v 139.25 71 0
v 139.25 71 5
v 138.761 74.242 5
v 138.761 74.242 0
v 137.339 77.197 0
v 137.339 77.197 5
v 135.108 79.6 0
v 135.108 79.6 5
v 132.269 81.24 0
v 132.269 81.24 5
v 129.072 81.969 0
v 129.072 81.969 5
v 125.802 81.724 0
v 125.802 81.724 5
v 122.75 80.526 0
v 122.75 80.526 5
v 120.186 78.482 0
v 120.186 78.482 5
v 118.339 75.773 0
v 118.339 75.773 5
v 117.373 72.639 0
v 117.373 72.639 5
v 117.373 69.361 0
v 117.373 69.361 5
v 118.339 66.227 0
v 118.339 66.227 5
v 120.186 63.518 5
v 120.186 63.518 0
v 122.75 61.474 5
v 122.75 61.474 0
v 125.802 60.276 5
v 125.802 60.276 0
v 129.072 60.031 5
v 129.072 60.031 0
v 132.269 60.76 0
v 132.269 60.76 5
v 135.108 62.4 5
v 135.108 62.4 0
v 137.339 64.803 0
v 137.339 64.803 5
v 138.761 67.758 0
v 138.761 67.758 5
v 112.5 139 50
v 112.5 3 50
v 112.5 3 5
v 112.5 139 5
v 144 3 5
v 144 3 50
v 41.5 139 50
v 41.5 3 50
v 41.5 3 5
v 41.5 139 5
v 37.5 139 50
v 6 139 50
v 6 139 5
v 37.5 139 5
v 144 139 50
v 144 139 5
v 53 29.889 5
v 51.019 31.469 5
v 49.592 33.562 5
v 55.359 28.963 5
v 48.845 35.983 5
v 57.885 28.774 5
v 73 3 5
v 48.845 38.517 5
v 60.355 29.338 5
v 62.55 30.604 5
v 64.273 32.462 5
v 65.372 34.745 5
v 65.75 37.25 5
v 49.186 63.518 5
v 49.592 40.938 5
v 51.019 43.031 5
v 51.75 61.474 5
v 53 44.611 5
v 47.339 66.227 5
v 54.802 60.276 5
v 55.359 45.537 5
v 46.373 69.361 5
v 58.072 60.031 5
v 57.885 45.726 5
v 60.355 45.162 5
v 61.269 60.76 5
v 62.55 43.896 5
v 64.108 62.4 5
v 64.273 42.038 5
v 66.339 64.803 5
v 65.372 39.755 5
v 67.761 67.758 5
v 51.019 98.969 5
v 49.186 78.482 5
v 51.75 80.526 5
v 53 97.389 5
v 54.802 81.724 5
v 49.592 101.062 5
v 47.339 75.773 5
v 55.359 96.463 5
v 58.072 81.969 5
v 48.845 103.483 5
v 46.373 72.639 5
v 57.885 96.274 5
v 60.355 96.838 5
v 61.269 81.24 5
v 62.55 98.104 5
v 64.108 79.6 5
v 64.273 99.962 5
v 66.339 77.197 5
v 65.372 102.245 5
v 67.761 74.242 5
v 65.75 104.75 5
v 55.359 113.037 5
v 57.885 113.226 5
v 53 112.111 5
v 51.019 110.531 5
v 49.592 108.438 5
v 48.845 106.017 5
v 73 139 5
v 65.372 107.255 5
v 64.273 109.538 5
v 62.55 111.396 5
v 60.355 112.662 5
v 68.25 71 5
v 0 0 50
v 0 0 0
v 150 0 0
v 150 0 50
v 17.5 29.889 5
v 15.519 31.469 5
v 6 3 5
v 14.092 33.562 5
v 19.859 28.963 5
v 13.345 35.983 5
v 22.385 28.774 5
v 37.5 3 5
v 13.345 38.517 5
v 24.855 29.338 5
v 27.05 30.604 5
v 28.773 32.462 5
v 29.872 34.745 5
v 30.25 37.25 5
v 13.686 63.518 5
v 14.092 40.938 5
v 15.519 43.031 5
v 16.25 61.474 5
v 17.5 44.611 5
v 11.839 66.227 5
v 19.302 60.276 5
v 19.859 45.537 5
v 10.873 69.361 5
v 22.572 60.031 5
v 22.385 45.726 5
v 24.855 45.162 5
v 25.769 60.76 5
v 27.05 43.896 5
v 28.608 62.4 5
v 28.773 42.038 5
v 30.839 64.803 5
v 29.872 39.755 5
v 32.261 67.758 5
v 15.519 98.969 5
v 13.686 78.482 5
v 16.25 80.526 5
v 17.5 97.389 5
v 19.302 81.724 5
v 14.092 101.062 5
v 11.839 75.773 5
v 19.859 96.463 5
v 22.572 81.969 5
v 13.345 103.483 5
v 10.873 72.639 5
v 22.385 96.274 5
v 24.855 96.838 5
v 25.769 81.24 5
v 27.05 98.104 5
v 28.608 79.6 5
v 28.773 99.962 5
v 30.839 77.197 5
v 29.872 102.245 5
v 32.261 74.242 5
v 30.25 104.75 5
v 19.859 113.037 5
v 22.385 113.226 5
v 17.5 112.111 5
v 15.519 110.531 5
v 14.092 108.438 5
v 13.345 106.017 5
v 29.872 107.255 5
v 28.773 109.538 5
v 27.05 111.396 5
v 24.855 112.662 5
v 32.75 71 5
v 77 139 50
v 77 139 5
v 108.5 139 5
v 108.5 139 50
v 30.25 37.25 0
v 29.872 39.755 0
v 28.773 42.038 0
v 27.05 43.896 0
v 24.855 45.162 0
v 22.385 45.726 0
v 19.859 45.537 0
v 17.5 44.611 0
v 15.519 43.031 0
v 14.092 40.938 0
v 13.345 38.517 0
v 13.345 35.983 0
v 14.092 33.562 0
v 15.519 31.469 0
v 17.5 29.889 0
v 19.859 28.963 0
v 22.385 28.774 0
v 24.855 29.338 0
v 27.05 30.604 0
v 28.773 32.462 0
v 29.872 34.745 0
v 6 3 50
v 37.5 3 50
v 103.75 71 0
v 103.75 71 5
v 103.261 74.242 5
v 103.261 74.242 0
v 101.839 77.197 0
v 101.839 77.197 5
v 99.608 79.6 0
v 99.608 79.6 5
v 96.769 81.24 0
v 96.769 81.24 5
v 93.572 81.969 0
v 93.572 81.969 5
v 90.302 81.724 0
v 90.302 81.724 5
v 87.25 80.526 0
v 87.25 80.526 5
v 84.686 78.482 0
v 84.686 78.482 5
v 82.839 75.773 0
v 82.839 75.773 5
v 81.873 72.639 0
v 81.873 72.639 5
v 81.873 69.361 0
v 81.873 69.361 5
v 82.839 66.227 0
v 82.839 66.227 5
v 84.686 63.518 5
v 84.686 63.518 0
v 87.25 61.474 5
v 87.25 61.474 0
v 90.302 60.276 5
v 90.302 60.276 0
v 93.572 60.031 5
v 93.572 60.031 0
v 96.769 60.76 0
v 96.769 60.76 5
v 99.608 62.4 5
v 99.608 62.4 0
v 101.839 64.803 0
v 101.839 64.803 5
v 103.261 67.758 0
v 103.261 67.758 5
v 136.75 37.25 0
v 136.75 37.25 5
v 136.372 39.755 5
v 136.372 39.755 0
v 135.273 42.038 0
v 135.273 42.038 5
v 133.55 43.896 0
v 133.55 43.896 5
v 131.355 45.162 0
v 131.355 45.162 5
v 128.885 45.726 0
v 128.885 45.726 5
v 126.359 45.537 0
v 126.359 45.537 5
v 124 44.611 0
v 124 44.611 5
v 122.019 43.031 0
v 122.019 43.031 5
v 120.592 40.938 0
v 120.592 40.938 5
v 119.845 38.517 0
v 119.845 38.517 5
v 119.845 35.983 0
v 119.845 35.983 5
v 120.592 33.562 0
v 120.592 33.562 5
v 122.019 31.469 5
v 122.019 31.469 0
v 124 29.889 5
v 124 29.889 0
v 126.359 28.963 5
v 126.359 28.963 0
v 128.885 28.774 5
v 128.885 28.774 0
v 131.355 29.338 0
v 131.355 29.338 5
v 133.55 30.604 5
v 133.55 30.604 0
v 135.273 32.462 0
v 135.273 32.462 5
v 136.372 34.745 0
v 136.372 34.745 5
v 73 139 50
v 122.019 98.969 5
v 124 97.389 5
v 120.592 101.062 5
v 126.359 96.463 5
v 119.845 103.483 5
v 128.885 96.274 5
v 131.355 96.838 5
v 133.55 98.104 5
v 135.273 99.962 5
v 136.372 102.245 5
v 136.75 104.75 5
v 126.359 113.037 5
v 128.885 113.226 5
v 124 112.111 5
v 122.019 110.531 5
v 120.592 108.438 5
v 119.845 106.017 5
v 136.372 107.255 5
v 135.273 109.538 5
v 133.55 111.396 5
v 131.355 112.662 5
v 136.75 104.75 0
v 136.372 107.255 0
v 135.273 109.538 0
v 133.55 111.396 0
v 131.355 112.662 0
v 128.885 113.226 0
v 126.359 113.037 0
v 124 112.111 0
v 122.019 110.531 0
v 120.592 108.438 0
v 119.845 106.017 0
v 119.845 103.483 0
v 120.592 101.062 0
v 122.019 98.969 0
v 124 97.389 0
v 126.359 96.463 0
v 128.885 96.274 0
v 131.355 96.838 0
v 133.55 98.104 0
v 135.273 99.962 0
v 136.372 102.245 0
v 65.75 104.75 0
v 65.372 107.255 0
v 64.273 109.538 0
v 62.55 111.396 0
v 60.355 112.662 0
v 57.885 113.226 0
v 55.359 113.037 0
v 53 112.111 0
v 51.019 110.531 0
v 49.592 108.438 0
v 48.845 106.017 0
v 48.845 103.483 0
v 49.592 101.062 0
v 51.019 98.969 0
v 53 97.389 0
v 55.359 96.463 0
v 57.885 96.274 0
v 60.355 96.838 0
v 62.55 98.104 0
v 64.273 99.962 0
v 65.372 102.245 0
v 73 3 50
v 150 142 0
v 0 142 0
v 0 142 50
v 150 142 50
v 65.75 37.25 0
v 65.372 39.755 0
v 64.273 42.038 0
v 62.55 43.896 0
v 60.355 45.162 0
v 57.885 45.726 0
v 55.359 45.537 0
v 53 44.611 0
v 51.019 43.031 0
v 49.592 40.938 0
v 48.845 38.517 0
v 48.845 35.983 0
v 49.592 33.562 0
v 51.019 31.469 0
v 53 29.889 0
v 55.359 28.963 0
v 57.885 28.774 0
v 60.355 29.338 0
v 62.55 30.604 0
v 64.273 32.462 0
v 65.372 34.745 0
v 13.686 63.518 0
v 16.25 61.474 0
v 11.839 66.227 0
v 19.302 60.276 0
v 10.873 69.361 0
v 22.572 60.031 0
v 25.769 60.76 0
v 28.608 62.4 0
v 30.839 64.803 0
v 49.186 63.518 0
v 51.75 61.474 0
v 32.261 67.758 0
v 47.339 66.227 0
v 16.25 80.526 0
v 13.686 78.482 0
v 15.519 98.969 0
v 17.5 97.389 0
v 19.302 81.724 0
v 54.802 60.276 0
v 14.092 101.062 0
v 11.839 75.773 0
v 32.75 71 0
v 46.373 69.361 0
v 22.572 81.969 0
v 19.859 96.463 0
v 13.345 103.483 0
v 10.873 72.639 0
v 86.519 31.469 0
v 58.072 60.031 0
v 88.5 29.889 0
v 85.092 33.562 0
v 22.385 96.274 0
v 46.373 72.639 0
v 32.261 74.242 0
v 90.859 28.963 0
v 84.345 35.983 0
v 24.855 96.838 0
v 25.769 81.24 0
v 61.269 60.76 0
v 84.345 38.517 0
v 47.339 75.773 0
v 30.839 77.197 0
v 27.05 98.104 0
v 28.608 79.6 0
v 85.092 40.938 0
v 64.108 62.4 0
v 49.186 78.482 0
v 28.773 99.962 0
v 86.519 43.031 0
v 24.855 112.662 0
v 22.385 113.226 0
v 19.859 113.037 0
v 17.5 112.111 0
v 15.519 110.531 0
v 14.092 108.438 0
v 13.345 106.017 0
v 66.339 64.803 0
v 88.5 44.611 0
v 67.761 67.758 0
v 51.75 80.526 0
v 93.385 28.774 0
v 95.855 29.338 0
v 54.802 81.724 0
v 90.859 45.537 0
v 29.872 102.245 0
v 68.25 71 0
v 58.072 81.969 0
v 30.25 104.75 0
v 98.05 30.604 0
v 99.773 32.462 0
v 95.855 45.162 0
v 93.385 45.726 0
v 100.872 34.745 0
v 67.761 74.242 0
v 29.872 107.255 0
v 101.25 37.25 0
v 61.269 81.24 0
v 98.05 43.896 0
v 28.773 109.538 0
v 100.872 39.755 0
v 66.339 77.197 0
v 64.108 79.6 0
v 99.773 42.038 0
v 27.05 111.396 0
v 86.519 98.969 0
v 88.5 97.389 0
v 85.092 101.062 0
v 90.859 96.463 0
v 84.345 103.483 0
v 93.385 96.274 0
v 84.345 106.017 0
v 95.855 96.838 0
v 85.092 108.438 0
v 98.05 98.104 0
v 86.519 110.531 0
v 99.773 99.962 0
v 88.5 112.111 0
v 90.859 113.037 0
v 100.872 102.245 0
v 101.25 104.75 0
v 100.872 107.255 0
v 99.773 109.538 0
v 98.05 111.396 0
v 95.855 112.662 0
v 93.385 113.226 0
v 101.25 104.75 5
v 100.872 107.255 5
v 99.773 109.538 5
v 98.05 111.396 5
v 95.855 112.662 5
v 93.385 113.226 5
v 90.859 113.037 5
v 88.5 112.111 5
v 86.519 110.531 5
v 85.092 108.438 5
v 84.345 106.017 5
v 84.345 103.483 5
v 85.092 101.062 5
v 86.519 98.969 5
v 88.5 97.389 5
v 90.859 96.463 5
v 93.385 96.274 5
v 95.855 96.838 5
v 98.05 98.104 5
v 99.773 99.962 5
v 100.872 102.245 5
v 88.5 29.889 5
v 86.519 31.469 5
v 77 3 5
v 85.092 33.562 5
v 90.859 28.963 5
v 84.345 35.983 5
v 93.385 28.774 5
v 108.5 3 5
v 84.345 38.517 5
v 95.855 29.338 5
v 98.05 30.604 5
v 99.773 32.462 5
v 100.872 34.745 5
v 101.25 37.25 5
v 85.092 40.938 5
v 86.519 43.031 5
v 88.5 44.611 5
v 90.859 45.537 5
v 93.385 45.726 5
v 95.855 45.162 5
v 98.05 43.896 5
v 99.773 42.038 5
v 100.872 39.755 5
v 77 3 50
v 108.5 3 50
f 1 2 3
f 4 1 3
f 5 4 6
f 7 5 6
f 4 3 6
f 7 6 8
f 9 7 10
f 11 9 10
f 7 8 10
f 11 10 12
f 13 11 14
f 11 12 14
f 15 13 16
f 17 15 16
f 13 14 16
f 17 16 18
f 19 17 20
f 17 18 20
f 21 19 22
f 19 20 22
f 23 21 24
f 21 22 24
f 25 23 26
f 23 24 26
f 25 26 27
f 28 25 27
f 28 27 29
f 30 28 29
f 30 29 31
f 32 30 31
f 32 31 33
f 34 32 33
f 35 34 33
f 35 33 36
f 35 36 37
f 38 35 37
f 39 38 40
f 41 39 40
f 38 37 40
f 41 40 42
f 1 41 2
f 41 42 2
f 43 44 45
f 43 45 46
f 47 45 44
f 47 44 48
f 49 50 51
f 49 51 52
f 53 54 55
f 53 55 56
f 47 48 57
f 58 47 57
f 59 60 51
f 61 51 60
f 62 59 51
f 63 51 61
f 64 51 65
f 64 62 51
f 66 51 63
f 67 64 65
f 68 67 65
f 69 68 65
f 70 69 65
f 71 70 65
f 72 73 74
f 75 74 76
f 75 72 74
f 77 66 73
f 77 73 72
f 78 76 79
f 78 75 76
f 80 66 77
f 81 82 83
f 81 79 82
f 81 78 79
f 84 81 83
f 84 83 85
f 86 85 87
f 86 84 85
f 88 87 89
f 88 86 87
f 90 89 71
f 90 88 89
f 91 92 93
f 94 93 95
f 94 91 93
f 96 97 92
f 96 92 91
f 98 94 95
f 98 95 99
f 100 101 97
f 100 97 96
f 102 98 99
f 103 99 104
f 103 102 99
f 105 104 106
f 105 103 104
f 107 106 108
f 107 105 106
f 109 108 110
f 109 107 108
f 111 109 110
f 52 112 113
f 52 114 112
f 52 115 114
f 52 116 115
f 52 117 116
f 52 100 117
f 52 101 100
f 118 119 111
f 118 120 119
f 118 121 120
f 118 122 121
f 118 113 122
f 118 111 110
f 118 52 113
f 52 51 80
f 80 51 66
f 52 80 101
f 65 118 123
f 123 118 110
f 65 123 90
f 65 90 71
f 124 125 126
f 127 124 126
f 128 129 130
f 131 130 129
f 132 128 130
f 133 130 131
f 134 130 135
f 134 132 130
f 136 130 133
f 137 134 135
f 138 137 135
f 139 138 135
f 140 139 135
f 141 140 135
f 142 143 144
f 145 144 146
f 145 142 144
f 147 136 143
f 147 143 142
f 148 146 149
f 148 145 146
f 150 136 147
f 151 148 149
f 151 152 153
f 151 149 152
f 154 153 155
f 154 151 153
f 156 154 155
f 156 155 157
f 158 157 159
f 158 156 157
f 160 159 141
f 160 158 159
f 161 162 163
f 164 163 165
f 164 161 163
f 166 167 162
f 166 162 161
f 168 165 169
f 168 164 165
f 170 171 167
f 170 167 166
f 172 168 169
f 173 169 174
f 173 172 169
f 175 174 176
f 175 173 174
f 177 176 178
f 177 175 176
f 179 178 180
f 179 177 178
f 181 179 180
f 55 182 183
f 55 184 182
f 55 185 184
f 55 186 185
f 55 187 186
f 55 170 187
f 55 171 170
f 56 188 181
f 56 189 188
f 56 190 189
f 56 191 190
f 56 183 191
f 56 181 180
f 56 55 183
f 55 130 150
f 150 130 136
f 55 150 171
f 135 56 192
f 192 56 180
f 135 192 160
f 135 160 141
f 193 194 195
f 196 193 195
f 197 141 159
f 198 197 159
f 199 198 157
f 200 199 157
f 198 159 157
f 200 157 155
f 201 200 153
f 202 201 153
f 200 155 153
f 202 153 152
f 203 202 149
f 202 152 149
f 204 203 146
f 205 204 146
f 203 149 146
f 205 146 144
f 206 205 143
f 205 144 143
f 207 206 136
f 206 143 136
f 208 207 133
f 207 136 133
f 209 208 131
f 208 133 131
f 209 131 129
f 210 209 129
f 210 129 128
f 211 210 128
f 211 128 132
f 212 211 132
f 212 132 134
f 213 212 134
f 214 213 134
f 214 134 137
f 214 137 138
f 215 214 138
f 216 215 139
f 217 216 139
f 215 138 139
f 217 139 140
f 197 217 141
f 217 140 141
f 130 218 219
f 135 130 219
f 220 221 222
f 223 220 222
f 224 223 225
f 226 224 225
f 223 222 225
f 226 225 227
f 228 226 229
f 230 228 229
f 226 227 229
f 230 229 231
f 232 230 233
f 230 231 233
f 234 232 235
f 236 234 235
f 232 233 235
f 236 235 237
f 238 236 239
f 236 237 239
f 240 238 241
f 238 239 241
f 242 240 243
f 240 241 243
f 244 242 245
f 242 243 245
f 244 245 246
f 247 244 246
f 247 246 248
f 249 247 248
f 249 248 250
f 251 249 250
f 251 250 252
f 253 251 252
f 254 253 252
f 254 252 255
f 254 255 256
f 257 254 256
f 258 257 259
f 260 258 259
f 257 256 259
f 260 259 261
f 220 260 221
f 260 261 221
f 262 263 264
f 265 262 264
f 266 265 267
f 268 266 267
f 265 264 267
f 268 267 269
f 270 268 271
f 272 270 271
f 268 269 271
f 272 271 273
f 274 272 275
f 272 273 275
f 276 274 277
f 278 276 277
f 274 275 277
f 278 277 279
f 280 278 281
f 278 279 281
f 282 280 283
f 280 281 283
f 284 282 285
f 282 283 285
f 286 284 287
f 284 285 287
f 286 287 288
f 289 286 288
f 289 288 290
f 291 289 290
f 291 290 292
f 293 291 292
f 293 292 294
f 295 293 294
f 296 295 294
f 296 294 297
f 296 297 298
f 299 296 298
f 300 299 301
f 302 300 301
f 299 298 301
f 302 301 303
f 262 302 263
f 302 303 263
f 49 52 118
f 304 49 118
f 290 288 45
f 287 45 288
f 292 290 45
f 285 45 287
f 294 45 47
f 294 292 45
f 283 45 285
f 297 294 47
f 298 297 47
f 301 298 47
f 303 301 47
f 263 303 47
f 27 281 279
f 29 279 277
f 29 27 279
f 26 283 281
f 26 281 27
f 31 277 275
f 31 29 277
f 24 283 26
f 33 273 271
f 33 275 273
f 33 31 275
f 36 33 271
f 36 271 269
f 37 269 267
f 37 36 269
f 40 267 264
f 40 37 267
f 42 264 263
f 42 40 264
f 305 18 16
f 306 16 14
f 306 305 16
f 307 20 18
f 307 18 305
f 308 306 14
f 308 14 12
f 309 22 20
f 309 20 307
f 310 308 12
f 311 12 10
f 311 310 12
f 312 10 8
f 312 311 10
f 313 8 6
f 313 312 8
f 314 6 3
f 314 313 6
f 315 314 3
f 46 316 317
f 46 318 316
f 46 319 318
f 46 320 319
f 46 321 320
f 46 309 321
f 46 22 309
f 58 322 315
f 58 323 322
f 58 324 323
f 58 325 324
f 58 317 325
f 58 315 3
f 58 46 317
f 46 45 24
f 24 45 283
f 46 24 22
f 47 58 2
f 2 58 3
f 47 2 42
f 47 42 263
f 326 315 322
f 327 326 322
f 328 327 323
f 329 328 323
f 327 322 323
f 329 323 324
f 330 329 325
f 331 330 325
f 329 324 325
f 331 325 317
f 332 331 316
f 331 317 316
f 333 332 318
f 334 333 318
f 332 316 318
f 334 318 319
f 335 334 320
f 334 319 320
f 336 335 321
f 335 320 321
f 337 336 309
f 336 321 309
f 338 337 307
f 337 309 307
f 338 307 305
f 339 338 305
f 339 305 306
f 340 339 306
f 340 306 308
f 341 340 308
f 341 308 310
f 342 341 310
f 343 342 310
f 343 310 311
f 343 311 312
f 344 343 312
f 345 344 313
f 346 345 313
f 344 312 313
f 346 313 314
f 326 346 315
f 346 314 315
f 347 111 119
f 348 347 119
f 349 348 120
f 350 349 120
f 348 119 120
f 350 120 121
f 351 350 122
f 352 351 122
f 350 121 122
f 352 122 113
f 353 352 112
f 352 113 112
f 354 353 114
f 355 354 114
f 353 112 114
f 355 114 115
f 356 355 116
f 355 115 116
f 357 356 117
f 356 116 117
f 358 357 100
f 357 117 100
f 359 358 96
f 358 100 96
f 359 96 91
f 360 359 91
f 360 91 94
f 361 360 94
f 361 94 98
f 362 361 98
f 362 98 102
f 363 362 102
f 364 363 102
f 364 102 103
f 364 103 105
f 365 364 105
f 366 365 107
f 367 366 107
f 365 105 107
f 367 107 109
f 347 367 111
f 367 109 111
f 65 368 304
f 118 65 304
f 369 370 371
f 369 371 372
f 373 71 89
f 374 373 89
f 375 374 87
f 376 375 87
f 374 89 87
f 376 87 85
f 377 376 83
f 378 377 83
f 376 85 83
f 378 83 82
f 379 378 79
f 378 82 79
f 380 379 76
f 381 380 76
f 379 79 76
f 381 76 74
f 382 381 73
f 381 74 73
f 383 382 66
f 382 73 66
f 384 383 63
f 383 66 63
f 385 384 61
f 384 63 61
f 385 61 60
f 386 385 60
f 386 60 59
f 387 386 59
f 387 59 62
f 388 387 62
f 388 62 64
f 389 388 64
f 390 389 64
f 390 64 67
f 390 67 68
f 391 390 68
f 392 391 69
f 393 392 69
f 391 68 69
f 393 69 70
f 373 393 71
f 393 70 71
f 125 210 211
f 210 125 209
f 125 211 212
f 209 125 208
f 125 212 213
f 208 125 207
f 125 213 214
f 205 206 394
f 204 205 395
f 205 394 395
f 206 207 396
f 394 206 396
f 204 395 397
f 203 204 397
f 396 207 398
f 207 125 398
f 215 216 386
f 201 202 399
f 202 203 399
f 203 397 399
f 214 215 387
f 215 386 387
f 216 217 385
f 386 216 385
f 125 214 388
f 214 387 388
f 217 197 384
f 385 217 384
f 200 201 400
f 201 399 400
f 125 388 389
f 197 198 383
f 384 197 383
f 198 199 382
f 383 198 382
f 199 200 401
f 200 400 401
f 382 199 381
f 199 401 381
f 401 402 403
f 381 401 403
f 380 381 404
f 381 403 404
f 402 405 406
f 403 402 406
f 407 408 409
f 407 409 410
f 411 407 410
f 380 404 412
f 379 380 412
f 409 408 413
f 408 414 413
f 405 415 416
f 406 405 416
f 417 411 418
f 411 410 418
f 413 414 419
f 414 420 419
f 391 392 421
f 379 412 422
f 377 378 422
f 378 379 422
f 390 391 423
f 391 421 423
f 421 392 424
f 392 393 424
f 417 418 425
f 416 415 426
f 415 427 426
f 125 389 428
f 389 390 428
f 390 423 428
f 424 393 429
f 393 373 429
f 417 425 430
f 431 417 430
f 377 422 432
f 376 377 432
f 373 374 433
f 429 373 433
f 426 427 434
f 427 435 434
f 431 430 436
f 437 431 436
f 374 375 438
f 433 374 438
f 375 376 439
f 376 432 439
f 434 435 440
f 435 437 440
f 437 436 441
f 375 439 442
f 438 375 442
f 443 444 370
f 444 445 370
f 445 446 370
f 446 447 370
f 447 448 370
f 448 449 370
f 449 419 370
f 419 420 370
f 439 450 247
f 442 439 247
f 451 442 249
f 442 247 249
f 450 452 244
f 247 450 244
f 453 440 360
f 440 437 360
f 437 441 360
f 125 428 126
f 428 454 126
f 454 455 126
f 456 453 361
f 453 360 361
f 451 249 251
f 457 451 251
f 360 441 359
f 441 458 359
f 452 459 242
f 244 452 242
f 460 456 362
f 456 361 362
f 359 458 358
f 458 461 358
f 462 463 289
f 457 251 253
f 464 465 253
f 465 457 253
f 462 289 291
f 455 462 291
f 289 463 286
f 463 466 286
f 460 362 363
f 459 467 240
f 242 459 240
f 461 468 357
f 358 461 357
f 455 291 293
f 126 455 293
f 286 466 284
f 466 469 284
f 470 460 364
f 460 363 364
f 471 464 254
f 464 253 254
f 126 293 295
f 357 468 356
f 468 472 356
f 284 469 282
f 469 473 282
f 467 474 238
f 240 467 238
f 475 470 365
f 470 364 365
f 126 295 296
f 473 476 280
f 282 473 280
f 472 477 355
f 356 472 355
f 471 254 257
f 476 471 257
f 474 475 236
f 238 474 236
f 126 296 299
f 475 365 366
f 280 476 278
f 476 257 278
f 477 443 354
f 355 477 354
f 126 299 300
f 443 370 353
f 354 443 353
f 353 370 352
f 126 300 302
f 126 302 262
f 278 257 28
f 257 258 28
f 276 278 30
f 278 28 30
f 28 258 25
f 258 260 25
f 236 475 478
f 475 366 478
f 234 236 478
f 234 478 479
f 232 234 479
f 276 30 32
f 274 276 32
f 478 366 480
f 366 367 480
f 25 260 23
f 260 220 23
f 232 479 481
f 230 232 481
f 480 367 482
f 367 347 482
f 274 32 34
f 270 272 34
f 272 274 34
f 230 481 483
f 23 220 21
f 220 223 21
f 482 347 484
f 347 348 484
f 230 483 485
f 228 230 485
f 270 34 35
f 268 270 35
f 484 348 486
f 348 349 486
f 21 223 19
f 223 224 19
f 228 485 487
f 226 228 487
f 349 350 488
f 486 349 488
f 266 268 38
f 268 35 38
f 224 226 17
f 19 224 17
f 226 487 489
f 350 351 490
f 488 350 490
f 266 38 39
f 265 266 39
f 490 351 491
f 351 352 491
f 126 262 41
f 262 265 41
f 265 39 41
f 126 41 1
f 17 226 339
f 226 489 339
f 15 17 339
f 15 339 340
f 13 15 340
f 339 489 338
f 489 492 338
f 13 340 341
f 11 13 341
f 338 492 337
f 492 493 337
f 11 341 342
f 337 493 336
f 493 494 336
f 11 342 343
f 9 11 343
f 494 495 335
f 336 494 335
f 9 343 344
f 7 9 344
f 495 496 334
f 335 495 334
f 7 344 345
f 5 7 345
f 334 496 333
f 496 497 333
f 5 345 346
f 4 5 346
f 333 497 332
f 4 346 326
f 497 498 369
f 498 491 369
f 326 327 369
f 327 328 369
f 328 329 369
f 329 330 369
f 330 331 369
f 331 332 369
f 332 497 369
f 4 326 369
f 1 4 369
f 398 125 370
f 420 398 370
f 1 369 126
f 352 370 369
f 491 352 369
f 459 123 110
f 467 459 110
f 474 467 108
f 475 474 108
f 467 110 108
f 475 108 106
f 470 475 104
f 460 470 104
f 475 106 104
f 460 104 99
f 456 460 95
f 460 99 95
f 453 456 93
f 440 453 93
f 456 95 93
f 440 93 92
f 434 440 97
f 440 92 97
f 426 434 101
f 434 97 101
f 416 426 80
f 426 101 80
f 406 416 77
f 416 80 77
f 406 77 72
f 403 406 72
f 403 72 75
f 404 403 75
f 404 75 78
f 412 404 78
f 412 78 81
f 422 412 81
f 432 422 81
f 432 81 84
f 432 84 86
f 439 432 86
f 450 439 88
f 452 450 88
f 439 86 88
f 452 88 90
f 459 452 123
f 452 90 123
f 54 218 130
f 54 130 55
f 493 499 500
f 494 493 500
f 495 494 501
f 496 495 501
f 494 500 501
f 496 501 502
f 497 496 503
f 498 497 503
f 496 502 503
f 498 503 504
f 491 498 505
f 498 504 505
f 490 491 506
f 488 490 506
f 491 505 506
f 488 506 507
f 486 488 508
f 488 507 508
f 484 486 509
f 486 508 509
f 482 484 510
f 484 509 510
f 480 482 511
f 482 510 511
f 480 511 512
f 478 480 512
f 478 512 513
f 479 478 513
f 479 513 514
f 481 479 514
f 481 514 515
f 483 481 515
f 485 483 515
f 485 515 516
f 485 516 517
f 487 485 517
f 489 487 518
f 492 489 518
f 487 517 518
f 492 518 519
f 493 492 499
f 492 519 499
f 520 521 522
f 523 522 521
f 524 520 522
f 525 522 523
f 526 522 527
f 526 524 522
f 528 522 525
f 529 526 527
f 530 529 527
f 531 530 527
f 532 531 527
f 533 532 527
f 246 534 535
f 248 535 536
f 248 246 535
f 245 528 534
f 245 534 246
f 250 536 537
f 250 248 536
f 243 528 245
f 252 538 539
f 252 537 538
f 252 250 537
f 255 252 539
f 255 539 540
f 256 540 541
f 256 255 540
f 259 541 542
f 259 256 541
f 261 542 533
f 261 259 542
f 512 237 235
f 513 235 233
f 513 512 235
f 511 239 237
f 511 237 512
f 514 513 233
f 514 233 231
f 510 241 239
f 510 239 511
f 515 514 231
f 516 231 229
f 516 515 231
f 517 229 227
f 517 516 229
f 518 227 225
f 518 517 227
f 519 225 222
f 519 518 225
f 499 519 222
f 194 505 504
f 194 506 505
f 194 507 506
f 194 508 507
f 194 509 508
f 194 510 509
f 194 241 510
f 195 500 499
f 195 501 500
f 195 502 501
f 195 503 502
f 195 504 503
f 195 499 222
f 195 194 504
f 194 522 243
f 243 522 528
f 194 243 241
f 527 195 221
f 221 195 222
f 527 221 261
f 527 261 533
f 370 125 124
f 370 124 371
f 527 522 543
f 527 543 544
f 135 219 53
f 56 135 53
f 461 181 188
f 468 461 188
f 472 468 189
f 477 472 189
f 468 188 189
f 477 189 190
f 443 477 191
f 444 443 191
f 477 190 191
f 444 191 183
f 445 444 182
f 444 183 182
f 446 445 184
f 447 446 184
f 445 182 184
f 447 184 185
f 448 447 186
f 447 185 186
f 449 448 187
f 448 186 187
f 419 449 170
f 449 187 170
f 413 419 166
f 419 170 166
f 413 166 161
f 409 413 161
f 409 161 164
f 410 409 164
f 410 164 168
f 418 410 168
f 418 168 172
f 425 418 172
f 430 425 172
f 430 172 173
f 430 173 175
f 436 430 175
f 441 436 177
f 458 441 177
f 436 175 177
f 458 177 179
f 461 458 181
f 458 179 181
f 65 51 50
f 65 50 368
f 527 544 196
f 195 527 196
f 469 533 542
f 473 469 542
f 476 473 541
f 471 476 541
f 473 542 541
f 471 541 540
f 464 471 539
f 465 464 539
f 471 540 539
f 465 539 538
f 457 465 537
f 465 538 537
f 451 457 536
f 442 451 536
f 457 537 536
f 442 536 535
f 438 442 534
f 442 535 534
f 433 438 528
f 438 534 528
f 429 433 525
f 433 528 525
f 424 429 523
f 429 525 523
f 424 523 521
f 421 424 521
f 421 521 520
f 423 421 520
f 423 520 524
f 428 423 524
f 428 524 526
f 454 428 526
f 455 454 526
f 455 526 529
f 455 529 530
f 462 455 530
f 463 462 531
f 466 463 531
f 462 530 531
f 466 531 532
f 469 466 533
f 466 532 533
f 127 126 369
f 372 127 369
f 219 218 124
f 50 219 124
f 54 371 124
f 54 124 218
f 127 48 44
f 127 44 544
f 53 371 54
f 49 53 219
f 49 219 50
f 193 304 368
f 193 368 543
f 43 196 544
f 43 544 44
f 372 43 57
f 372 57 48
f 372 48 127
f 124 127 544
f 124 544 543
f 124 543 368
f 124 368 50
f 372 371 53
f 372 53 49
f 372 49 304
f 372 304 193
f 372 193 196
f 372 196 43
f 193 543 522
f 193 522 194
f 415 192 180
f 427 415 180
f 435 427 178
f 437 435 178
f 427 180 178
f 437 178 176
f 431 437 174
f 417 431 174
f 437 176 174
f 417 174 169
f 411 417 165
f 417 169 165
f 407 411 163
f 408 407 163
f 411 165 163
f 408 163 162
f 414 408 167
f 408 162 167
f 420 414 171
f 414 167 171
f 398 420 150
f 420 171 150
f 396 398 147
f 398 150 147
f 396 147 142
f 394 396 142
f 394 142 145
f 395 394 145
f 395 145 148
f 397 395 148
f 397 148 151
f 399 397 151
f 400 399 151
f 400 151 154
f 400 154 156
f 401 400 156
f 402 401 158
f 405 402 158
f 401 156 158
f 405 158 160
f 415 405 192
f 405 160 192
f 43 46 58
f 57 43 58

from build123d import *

# Parameters (mm, degrees)
SKETCH_W        = 150
SKETCH_H        = 142
PAD_DEPTH       = 50
SKETCH001_W     = 31.5
SKETCH001_H     = 136
POCKET_DEPTH    = 45
SKETCH002_R     = 8.5
SKETCH002_R_2   = 11
POCKET001_DEPTH = 5


with BuildPart() as part:
    # Sketch → Pad (new body)
    with BuildSketch(Plane.XY):
        with Locations((75, 71)):
            Rectangle(SKETCH_W, SKETCH_H)
    extrude(amount=PAD_DEPTH)

    # Sketch001 → Pocket (cut)
    with BuildSketch(Plane.XY.offset(50)):
        with Locations((21.75, 71)):
            Rectangle(SKETCH001_W, SKETCH001_H)
        with Locations((57.25, 71)):
            Rectangle(SKETCH001_W, SKETCH001_H)
        with Locations((92.75, 71)):
            Rectangle(SKETCH001_W, SKETCH001_H)
        with Locations((128.25, 71)):
            Rectangle(SKETCH001_W, SKETCH001_H)
    extrude(amount=-POCKET_DEPTH, mode=Mode.SUBTRACT)

    # Sketch002 → Pocket001 (cut)
    with BuildSketch(Plane.XY.offset(5)):
        with Locations((21.75, 37.25)):
            Circle(SKETCH002_R)
        with Locations((21.75, 71)):
            Circle(SKETCH002_R_2)
        with Locations((21.75, 104.75)):
            Circle(SKETCH002_R)
        with Locations((57.25, 37.25)):
            Circle(SKETCH002_R)
        with Locations((57.25, 71)):
            Circle(SKETCH002_R_2)
        with Locations((57.25, 104.75)):
            Circle(SKETCH002_R)
        with Locations((92.75, 37.25)):
            Circle(SKETCH002_R)
        with Locations((92.75, 71)):
            Circle(SKETCH002_R_2)
        with Locations((92.75, 104.75)):
            Circle(SKETCH002_R)
        with Locations((128.25, 37.25)):
            Circle(SKETCH002_R)
        with Locations((128.25, 71)):
            Circle(SKETCH002_R_2)
        with Locations((128.25, 104.75)):
            Circle(SKETCH002_R)
    extrude(amount=-POCKET001_DEPTH, mode=Mode.SUBTRACT)


solid = part.part
